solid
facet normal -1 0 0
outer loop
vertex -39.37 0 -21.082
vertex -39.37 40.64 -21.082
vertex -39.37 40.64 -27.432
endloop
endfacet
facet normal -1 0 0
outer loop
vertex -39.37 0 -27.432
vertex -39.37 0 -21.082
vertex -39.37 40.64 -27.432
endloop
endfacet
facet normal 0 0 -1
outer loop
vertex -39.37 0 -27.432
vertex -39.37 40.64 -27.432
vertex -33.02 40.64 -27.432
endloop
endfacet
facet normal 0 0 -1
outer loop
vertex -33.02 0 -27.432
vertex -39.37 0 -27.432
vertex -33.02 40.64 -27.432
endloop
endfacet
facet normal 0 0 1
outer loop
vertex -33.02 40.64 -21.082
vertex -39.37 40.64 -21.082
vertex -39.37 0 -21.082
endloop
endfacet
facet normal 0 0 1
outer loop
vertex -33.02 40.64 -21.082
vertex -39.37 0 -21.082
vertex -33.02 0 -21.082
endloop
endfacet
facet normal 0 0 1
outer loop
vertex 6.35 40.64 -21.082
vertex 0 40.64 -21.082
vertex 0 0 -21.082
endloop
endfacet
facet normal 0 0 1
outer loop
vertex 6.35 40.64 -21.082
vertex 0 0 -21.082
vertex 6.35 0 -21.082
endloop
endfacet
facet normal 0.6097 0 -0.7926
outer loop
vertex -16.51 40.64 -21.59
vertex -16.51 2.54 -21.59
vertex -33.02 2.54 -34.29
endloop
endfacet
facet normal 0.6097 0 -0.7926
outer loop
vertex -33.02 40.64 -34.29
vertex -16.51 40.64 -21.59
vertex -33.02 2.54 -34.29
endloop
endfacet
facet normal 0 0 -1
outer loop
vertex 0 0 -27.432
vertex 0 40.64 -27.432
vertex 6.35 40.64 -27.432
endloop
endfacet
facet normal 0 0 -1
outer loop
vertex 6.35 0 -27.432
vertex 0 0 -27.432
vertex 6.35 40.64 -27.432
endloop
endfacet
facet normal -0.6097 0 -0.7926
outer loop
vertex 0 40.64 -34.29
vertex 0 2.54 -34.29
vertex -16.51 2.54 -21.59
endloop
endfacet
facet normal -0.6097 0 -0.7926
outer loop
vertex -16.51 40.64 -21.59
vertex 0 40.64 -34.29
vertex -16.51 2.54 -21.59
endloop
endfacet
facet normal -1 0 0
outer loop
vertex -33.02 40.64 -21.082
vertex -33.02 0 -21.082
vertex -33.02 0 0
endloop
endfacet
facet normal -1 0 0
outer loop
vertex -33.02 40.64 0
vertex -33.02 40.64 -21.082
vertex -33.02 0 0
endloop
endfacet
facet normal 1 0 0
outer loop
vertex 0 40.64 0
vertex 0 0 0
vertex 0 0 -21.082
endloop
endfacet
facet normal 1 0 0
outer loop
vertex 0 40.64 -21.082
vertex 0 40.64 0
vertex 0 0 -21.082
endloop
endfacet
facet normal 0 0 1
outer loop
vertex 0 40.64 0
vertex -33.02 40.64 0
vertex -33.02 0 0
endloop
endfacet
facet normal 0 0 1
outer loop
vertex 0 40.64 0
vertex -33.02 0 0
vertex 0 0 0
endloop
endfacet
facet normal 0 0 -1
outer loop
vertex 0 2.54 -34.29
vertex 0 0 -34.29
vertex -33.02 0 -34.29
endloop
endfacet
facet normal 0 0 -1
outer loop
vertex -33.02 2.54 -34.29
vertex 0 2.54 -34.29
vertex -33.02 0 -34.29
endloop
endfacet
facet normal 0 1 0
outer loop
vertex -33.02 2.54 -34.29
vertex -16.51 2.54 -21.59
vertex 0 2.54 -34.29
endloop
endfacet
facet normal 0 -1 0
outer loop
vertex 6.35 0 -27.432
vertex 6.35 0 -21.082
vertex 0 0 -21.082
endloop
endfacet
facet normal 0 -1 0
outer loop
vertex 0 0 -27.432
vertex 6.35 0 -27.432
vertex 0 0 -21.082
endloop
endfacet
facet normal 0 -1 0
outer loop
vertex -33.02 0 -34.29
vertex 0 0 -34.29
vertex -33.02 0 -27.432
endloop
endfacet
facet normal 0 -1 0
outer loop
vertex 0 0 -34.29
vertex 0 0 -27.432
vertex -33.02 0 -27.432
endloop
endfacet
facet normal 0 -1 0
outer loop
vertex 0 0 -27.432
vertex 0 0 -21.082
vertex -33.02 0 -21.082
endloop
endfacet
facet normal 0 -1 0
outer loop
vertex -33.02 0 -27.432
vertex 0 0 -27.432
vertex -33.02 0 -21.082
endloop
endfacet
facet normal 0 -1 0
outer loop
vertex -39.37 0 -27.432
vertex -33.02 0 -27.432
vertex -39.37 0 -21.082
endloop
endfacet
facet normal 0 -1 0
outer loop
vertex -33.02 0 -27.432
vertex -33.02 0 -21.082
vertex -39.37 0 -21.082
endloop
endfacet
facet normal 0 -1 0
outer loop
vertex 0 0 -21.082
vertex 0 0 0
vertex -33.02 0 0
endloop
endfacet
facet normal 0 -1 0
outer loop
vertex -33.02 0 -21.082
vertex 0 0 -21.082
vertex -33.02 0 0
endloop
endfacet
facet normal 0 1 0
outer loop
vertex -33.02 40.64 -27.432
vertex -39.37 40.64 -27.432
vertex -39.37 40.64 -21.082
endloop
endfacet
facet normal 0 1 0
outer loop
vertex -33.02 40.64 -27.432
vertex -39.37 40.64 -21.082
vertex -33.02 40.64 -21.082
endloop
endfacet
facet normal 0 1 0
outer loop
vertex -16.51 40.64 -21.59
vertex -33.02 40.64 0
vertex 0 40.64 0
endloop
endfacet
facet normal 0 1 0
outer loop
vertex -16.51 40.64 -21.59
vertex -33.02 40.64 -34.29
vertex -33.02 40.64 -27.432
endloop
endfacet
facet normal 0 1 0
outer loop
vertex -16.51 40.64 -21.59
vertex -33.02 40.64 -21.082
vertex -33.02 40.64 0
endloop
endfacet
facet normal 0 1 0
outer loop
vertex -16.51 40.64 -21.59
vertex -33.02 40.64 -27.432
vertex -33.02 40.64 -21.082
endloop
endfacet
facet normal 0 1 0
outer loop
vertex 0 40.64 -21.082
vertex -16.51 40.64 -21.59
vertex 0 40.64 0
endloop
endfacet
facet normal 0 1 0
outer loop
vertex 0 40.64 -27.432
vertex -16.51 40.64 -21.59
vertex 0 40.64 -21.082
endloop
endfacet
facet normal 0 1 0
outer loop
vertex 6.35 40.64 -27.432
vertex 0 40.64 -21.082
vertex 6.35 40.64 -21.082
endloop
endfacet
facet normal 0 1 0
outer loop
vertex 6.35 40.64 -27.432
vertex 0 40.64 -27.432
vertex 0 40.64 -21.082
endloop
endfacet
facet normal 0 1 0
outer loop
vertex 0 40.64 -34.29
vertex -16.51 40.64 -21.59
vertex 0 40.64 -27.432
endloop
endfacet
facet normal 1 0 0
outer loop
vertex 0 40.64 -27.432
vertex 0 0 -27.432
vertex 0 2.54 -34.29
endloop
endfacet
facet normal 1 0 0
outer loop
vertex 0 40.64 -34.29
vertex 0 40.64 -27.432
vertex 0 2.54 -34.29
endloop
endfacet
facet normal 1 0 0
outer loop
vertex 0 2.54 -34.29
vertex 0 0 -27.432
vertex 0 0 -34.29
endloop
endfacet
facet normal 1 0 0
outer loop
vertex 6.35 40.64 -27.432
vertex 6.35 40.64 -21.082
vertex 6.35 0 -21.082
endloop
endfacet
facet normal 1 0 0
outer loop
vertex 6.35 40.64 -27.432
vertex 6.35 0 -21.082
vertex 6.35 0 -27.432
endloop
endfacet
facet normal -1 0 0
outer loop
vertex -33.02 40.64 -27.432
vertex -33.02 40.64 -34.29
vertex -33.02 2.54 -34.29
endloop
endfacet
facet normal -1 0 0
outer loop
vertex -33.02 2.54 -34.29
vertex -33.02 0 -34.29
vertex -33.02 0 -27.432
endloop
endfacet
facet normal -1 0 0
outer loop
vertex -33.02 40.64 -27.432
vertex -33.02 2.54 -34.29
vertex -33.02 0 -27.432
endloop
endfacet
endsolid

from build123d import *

# Parameters (mm, degrees)
SKETCH2_W           = 6.35
SKETCH2_H           = 6.35
BOSS_EXTRUDE1_DEPTH = 40.64
BOSS_EXTRUDE2_DEPTH = 2.54


with BuildPart() as part:
    # Sketch2 → Boss-Extrude1 (new body)
    with BuildSketch(Plane(origin=(0, 0, 0), x_dir=(1, 0, 0), z_dir=(0, 1, 0))):
        Polygon((-33.02, 0), (0, 0), (0, 21.082), (0, 27.432), (0, 34.29), (-16.51, 21.59), (-33.02, 34.29), (-33.02, 27.432), (-33.02, 21.082), align=None)
        with Locations((-36.195, 24.257)):
            Rectangle(SKETCH2_W, SKETCH2_H)
        with Locations((3.175, 24.257)):
            Rectangle(SKETCH2_W, SKETCH2_H)
    extrude(amount=BOSS_EXTRUDE1_DEPTH)

    # Sketch5 → Boss-Extrude2 (add)
    with BuildSketch(Plane.XZ):
        Polygon((0, -34.29), (-33.02, -34.29), (-16.51, -21.59), align=None)
    extrude(amount=-BOSS_EXTRUDE2_DEPTH)


solid = part.part
